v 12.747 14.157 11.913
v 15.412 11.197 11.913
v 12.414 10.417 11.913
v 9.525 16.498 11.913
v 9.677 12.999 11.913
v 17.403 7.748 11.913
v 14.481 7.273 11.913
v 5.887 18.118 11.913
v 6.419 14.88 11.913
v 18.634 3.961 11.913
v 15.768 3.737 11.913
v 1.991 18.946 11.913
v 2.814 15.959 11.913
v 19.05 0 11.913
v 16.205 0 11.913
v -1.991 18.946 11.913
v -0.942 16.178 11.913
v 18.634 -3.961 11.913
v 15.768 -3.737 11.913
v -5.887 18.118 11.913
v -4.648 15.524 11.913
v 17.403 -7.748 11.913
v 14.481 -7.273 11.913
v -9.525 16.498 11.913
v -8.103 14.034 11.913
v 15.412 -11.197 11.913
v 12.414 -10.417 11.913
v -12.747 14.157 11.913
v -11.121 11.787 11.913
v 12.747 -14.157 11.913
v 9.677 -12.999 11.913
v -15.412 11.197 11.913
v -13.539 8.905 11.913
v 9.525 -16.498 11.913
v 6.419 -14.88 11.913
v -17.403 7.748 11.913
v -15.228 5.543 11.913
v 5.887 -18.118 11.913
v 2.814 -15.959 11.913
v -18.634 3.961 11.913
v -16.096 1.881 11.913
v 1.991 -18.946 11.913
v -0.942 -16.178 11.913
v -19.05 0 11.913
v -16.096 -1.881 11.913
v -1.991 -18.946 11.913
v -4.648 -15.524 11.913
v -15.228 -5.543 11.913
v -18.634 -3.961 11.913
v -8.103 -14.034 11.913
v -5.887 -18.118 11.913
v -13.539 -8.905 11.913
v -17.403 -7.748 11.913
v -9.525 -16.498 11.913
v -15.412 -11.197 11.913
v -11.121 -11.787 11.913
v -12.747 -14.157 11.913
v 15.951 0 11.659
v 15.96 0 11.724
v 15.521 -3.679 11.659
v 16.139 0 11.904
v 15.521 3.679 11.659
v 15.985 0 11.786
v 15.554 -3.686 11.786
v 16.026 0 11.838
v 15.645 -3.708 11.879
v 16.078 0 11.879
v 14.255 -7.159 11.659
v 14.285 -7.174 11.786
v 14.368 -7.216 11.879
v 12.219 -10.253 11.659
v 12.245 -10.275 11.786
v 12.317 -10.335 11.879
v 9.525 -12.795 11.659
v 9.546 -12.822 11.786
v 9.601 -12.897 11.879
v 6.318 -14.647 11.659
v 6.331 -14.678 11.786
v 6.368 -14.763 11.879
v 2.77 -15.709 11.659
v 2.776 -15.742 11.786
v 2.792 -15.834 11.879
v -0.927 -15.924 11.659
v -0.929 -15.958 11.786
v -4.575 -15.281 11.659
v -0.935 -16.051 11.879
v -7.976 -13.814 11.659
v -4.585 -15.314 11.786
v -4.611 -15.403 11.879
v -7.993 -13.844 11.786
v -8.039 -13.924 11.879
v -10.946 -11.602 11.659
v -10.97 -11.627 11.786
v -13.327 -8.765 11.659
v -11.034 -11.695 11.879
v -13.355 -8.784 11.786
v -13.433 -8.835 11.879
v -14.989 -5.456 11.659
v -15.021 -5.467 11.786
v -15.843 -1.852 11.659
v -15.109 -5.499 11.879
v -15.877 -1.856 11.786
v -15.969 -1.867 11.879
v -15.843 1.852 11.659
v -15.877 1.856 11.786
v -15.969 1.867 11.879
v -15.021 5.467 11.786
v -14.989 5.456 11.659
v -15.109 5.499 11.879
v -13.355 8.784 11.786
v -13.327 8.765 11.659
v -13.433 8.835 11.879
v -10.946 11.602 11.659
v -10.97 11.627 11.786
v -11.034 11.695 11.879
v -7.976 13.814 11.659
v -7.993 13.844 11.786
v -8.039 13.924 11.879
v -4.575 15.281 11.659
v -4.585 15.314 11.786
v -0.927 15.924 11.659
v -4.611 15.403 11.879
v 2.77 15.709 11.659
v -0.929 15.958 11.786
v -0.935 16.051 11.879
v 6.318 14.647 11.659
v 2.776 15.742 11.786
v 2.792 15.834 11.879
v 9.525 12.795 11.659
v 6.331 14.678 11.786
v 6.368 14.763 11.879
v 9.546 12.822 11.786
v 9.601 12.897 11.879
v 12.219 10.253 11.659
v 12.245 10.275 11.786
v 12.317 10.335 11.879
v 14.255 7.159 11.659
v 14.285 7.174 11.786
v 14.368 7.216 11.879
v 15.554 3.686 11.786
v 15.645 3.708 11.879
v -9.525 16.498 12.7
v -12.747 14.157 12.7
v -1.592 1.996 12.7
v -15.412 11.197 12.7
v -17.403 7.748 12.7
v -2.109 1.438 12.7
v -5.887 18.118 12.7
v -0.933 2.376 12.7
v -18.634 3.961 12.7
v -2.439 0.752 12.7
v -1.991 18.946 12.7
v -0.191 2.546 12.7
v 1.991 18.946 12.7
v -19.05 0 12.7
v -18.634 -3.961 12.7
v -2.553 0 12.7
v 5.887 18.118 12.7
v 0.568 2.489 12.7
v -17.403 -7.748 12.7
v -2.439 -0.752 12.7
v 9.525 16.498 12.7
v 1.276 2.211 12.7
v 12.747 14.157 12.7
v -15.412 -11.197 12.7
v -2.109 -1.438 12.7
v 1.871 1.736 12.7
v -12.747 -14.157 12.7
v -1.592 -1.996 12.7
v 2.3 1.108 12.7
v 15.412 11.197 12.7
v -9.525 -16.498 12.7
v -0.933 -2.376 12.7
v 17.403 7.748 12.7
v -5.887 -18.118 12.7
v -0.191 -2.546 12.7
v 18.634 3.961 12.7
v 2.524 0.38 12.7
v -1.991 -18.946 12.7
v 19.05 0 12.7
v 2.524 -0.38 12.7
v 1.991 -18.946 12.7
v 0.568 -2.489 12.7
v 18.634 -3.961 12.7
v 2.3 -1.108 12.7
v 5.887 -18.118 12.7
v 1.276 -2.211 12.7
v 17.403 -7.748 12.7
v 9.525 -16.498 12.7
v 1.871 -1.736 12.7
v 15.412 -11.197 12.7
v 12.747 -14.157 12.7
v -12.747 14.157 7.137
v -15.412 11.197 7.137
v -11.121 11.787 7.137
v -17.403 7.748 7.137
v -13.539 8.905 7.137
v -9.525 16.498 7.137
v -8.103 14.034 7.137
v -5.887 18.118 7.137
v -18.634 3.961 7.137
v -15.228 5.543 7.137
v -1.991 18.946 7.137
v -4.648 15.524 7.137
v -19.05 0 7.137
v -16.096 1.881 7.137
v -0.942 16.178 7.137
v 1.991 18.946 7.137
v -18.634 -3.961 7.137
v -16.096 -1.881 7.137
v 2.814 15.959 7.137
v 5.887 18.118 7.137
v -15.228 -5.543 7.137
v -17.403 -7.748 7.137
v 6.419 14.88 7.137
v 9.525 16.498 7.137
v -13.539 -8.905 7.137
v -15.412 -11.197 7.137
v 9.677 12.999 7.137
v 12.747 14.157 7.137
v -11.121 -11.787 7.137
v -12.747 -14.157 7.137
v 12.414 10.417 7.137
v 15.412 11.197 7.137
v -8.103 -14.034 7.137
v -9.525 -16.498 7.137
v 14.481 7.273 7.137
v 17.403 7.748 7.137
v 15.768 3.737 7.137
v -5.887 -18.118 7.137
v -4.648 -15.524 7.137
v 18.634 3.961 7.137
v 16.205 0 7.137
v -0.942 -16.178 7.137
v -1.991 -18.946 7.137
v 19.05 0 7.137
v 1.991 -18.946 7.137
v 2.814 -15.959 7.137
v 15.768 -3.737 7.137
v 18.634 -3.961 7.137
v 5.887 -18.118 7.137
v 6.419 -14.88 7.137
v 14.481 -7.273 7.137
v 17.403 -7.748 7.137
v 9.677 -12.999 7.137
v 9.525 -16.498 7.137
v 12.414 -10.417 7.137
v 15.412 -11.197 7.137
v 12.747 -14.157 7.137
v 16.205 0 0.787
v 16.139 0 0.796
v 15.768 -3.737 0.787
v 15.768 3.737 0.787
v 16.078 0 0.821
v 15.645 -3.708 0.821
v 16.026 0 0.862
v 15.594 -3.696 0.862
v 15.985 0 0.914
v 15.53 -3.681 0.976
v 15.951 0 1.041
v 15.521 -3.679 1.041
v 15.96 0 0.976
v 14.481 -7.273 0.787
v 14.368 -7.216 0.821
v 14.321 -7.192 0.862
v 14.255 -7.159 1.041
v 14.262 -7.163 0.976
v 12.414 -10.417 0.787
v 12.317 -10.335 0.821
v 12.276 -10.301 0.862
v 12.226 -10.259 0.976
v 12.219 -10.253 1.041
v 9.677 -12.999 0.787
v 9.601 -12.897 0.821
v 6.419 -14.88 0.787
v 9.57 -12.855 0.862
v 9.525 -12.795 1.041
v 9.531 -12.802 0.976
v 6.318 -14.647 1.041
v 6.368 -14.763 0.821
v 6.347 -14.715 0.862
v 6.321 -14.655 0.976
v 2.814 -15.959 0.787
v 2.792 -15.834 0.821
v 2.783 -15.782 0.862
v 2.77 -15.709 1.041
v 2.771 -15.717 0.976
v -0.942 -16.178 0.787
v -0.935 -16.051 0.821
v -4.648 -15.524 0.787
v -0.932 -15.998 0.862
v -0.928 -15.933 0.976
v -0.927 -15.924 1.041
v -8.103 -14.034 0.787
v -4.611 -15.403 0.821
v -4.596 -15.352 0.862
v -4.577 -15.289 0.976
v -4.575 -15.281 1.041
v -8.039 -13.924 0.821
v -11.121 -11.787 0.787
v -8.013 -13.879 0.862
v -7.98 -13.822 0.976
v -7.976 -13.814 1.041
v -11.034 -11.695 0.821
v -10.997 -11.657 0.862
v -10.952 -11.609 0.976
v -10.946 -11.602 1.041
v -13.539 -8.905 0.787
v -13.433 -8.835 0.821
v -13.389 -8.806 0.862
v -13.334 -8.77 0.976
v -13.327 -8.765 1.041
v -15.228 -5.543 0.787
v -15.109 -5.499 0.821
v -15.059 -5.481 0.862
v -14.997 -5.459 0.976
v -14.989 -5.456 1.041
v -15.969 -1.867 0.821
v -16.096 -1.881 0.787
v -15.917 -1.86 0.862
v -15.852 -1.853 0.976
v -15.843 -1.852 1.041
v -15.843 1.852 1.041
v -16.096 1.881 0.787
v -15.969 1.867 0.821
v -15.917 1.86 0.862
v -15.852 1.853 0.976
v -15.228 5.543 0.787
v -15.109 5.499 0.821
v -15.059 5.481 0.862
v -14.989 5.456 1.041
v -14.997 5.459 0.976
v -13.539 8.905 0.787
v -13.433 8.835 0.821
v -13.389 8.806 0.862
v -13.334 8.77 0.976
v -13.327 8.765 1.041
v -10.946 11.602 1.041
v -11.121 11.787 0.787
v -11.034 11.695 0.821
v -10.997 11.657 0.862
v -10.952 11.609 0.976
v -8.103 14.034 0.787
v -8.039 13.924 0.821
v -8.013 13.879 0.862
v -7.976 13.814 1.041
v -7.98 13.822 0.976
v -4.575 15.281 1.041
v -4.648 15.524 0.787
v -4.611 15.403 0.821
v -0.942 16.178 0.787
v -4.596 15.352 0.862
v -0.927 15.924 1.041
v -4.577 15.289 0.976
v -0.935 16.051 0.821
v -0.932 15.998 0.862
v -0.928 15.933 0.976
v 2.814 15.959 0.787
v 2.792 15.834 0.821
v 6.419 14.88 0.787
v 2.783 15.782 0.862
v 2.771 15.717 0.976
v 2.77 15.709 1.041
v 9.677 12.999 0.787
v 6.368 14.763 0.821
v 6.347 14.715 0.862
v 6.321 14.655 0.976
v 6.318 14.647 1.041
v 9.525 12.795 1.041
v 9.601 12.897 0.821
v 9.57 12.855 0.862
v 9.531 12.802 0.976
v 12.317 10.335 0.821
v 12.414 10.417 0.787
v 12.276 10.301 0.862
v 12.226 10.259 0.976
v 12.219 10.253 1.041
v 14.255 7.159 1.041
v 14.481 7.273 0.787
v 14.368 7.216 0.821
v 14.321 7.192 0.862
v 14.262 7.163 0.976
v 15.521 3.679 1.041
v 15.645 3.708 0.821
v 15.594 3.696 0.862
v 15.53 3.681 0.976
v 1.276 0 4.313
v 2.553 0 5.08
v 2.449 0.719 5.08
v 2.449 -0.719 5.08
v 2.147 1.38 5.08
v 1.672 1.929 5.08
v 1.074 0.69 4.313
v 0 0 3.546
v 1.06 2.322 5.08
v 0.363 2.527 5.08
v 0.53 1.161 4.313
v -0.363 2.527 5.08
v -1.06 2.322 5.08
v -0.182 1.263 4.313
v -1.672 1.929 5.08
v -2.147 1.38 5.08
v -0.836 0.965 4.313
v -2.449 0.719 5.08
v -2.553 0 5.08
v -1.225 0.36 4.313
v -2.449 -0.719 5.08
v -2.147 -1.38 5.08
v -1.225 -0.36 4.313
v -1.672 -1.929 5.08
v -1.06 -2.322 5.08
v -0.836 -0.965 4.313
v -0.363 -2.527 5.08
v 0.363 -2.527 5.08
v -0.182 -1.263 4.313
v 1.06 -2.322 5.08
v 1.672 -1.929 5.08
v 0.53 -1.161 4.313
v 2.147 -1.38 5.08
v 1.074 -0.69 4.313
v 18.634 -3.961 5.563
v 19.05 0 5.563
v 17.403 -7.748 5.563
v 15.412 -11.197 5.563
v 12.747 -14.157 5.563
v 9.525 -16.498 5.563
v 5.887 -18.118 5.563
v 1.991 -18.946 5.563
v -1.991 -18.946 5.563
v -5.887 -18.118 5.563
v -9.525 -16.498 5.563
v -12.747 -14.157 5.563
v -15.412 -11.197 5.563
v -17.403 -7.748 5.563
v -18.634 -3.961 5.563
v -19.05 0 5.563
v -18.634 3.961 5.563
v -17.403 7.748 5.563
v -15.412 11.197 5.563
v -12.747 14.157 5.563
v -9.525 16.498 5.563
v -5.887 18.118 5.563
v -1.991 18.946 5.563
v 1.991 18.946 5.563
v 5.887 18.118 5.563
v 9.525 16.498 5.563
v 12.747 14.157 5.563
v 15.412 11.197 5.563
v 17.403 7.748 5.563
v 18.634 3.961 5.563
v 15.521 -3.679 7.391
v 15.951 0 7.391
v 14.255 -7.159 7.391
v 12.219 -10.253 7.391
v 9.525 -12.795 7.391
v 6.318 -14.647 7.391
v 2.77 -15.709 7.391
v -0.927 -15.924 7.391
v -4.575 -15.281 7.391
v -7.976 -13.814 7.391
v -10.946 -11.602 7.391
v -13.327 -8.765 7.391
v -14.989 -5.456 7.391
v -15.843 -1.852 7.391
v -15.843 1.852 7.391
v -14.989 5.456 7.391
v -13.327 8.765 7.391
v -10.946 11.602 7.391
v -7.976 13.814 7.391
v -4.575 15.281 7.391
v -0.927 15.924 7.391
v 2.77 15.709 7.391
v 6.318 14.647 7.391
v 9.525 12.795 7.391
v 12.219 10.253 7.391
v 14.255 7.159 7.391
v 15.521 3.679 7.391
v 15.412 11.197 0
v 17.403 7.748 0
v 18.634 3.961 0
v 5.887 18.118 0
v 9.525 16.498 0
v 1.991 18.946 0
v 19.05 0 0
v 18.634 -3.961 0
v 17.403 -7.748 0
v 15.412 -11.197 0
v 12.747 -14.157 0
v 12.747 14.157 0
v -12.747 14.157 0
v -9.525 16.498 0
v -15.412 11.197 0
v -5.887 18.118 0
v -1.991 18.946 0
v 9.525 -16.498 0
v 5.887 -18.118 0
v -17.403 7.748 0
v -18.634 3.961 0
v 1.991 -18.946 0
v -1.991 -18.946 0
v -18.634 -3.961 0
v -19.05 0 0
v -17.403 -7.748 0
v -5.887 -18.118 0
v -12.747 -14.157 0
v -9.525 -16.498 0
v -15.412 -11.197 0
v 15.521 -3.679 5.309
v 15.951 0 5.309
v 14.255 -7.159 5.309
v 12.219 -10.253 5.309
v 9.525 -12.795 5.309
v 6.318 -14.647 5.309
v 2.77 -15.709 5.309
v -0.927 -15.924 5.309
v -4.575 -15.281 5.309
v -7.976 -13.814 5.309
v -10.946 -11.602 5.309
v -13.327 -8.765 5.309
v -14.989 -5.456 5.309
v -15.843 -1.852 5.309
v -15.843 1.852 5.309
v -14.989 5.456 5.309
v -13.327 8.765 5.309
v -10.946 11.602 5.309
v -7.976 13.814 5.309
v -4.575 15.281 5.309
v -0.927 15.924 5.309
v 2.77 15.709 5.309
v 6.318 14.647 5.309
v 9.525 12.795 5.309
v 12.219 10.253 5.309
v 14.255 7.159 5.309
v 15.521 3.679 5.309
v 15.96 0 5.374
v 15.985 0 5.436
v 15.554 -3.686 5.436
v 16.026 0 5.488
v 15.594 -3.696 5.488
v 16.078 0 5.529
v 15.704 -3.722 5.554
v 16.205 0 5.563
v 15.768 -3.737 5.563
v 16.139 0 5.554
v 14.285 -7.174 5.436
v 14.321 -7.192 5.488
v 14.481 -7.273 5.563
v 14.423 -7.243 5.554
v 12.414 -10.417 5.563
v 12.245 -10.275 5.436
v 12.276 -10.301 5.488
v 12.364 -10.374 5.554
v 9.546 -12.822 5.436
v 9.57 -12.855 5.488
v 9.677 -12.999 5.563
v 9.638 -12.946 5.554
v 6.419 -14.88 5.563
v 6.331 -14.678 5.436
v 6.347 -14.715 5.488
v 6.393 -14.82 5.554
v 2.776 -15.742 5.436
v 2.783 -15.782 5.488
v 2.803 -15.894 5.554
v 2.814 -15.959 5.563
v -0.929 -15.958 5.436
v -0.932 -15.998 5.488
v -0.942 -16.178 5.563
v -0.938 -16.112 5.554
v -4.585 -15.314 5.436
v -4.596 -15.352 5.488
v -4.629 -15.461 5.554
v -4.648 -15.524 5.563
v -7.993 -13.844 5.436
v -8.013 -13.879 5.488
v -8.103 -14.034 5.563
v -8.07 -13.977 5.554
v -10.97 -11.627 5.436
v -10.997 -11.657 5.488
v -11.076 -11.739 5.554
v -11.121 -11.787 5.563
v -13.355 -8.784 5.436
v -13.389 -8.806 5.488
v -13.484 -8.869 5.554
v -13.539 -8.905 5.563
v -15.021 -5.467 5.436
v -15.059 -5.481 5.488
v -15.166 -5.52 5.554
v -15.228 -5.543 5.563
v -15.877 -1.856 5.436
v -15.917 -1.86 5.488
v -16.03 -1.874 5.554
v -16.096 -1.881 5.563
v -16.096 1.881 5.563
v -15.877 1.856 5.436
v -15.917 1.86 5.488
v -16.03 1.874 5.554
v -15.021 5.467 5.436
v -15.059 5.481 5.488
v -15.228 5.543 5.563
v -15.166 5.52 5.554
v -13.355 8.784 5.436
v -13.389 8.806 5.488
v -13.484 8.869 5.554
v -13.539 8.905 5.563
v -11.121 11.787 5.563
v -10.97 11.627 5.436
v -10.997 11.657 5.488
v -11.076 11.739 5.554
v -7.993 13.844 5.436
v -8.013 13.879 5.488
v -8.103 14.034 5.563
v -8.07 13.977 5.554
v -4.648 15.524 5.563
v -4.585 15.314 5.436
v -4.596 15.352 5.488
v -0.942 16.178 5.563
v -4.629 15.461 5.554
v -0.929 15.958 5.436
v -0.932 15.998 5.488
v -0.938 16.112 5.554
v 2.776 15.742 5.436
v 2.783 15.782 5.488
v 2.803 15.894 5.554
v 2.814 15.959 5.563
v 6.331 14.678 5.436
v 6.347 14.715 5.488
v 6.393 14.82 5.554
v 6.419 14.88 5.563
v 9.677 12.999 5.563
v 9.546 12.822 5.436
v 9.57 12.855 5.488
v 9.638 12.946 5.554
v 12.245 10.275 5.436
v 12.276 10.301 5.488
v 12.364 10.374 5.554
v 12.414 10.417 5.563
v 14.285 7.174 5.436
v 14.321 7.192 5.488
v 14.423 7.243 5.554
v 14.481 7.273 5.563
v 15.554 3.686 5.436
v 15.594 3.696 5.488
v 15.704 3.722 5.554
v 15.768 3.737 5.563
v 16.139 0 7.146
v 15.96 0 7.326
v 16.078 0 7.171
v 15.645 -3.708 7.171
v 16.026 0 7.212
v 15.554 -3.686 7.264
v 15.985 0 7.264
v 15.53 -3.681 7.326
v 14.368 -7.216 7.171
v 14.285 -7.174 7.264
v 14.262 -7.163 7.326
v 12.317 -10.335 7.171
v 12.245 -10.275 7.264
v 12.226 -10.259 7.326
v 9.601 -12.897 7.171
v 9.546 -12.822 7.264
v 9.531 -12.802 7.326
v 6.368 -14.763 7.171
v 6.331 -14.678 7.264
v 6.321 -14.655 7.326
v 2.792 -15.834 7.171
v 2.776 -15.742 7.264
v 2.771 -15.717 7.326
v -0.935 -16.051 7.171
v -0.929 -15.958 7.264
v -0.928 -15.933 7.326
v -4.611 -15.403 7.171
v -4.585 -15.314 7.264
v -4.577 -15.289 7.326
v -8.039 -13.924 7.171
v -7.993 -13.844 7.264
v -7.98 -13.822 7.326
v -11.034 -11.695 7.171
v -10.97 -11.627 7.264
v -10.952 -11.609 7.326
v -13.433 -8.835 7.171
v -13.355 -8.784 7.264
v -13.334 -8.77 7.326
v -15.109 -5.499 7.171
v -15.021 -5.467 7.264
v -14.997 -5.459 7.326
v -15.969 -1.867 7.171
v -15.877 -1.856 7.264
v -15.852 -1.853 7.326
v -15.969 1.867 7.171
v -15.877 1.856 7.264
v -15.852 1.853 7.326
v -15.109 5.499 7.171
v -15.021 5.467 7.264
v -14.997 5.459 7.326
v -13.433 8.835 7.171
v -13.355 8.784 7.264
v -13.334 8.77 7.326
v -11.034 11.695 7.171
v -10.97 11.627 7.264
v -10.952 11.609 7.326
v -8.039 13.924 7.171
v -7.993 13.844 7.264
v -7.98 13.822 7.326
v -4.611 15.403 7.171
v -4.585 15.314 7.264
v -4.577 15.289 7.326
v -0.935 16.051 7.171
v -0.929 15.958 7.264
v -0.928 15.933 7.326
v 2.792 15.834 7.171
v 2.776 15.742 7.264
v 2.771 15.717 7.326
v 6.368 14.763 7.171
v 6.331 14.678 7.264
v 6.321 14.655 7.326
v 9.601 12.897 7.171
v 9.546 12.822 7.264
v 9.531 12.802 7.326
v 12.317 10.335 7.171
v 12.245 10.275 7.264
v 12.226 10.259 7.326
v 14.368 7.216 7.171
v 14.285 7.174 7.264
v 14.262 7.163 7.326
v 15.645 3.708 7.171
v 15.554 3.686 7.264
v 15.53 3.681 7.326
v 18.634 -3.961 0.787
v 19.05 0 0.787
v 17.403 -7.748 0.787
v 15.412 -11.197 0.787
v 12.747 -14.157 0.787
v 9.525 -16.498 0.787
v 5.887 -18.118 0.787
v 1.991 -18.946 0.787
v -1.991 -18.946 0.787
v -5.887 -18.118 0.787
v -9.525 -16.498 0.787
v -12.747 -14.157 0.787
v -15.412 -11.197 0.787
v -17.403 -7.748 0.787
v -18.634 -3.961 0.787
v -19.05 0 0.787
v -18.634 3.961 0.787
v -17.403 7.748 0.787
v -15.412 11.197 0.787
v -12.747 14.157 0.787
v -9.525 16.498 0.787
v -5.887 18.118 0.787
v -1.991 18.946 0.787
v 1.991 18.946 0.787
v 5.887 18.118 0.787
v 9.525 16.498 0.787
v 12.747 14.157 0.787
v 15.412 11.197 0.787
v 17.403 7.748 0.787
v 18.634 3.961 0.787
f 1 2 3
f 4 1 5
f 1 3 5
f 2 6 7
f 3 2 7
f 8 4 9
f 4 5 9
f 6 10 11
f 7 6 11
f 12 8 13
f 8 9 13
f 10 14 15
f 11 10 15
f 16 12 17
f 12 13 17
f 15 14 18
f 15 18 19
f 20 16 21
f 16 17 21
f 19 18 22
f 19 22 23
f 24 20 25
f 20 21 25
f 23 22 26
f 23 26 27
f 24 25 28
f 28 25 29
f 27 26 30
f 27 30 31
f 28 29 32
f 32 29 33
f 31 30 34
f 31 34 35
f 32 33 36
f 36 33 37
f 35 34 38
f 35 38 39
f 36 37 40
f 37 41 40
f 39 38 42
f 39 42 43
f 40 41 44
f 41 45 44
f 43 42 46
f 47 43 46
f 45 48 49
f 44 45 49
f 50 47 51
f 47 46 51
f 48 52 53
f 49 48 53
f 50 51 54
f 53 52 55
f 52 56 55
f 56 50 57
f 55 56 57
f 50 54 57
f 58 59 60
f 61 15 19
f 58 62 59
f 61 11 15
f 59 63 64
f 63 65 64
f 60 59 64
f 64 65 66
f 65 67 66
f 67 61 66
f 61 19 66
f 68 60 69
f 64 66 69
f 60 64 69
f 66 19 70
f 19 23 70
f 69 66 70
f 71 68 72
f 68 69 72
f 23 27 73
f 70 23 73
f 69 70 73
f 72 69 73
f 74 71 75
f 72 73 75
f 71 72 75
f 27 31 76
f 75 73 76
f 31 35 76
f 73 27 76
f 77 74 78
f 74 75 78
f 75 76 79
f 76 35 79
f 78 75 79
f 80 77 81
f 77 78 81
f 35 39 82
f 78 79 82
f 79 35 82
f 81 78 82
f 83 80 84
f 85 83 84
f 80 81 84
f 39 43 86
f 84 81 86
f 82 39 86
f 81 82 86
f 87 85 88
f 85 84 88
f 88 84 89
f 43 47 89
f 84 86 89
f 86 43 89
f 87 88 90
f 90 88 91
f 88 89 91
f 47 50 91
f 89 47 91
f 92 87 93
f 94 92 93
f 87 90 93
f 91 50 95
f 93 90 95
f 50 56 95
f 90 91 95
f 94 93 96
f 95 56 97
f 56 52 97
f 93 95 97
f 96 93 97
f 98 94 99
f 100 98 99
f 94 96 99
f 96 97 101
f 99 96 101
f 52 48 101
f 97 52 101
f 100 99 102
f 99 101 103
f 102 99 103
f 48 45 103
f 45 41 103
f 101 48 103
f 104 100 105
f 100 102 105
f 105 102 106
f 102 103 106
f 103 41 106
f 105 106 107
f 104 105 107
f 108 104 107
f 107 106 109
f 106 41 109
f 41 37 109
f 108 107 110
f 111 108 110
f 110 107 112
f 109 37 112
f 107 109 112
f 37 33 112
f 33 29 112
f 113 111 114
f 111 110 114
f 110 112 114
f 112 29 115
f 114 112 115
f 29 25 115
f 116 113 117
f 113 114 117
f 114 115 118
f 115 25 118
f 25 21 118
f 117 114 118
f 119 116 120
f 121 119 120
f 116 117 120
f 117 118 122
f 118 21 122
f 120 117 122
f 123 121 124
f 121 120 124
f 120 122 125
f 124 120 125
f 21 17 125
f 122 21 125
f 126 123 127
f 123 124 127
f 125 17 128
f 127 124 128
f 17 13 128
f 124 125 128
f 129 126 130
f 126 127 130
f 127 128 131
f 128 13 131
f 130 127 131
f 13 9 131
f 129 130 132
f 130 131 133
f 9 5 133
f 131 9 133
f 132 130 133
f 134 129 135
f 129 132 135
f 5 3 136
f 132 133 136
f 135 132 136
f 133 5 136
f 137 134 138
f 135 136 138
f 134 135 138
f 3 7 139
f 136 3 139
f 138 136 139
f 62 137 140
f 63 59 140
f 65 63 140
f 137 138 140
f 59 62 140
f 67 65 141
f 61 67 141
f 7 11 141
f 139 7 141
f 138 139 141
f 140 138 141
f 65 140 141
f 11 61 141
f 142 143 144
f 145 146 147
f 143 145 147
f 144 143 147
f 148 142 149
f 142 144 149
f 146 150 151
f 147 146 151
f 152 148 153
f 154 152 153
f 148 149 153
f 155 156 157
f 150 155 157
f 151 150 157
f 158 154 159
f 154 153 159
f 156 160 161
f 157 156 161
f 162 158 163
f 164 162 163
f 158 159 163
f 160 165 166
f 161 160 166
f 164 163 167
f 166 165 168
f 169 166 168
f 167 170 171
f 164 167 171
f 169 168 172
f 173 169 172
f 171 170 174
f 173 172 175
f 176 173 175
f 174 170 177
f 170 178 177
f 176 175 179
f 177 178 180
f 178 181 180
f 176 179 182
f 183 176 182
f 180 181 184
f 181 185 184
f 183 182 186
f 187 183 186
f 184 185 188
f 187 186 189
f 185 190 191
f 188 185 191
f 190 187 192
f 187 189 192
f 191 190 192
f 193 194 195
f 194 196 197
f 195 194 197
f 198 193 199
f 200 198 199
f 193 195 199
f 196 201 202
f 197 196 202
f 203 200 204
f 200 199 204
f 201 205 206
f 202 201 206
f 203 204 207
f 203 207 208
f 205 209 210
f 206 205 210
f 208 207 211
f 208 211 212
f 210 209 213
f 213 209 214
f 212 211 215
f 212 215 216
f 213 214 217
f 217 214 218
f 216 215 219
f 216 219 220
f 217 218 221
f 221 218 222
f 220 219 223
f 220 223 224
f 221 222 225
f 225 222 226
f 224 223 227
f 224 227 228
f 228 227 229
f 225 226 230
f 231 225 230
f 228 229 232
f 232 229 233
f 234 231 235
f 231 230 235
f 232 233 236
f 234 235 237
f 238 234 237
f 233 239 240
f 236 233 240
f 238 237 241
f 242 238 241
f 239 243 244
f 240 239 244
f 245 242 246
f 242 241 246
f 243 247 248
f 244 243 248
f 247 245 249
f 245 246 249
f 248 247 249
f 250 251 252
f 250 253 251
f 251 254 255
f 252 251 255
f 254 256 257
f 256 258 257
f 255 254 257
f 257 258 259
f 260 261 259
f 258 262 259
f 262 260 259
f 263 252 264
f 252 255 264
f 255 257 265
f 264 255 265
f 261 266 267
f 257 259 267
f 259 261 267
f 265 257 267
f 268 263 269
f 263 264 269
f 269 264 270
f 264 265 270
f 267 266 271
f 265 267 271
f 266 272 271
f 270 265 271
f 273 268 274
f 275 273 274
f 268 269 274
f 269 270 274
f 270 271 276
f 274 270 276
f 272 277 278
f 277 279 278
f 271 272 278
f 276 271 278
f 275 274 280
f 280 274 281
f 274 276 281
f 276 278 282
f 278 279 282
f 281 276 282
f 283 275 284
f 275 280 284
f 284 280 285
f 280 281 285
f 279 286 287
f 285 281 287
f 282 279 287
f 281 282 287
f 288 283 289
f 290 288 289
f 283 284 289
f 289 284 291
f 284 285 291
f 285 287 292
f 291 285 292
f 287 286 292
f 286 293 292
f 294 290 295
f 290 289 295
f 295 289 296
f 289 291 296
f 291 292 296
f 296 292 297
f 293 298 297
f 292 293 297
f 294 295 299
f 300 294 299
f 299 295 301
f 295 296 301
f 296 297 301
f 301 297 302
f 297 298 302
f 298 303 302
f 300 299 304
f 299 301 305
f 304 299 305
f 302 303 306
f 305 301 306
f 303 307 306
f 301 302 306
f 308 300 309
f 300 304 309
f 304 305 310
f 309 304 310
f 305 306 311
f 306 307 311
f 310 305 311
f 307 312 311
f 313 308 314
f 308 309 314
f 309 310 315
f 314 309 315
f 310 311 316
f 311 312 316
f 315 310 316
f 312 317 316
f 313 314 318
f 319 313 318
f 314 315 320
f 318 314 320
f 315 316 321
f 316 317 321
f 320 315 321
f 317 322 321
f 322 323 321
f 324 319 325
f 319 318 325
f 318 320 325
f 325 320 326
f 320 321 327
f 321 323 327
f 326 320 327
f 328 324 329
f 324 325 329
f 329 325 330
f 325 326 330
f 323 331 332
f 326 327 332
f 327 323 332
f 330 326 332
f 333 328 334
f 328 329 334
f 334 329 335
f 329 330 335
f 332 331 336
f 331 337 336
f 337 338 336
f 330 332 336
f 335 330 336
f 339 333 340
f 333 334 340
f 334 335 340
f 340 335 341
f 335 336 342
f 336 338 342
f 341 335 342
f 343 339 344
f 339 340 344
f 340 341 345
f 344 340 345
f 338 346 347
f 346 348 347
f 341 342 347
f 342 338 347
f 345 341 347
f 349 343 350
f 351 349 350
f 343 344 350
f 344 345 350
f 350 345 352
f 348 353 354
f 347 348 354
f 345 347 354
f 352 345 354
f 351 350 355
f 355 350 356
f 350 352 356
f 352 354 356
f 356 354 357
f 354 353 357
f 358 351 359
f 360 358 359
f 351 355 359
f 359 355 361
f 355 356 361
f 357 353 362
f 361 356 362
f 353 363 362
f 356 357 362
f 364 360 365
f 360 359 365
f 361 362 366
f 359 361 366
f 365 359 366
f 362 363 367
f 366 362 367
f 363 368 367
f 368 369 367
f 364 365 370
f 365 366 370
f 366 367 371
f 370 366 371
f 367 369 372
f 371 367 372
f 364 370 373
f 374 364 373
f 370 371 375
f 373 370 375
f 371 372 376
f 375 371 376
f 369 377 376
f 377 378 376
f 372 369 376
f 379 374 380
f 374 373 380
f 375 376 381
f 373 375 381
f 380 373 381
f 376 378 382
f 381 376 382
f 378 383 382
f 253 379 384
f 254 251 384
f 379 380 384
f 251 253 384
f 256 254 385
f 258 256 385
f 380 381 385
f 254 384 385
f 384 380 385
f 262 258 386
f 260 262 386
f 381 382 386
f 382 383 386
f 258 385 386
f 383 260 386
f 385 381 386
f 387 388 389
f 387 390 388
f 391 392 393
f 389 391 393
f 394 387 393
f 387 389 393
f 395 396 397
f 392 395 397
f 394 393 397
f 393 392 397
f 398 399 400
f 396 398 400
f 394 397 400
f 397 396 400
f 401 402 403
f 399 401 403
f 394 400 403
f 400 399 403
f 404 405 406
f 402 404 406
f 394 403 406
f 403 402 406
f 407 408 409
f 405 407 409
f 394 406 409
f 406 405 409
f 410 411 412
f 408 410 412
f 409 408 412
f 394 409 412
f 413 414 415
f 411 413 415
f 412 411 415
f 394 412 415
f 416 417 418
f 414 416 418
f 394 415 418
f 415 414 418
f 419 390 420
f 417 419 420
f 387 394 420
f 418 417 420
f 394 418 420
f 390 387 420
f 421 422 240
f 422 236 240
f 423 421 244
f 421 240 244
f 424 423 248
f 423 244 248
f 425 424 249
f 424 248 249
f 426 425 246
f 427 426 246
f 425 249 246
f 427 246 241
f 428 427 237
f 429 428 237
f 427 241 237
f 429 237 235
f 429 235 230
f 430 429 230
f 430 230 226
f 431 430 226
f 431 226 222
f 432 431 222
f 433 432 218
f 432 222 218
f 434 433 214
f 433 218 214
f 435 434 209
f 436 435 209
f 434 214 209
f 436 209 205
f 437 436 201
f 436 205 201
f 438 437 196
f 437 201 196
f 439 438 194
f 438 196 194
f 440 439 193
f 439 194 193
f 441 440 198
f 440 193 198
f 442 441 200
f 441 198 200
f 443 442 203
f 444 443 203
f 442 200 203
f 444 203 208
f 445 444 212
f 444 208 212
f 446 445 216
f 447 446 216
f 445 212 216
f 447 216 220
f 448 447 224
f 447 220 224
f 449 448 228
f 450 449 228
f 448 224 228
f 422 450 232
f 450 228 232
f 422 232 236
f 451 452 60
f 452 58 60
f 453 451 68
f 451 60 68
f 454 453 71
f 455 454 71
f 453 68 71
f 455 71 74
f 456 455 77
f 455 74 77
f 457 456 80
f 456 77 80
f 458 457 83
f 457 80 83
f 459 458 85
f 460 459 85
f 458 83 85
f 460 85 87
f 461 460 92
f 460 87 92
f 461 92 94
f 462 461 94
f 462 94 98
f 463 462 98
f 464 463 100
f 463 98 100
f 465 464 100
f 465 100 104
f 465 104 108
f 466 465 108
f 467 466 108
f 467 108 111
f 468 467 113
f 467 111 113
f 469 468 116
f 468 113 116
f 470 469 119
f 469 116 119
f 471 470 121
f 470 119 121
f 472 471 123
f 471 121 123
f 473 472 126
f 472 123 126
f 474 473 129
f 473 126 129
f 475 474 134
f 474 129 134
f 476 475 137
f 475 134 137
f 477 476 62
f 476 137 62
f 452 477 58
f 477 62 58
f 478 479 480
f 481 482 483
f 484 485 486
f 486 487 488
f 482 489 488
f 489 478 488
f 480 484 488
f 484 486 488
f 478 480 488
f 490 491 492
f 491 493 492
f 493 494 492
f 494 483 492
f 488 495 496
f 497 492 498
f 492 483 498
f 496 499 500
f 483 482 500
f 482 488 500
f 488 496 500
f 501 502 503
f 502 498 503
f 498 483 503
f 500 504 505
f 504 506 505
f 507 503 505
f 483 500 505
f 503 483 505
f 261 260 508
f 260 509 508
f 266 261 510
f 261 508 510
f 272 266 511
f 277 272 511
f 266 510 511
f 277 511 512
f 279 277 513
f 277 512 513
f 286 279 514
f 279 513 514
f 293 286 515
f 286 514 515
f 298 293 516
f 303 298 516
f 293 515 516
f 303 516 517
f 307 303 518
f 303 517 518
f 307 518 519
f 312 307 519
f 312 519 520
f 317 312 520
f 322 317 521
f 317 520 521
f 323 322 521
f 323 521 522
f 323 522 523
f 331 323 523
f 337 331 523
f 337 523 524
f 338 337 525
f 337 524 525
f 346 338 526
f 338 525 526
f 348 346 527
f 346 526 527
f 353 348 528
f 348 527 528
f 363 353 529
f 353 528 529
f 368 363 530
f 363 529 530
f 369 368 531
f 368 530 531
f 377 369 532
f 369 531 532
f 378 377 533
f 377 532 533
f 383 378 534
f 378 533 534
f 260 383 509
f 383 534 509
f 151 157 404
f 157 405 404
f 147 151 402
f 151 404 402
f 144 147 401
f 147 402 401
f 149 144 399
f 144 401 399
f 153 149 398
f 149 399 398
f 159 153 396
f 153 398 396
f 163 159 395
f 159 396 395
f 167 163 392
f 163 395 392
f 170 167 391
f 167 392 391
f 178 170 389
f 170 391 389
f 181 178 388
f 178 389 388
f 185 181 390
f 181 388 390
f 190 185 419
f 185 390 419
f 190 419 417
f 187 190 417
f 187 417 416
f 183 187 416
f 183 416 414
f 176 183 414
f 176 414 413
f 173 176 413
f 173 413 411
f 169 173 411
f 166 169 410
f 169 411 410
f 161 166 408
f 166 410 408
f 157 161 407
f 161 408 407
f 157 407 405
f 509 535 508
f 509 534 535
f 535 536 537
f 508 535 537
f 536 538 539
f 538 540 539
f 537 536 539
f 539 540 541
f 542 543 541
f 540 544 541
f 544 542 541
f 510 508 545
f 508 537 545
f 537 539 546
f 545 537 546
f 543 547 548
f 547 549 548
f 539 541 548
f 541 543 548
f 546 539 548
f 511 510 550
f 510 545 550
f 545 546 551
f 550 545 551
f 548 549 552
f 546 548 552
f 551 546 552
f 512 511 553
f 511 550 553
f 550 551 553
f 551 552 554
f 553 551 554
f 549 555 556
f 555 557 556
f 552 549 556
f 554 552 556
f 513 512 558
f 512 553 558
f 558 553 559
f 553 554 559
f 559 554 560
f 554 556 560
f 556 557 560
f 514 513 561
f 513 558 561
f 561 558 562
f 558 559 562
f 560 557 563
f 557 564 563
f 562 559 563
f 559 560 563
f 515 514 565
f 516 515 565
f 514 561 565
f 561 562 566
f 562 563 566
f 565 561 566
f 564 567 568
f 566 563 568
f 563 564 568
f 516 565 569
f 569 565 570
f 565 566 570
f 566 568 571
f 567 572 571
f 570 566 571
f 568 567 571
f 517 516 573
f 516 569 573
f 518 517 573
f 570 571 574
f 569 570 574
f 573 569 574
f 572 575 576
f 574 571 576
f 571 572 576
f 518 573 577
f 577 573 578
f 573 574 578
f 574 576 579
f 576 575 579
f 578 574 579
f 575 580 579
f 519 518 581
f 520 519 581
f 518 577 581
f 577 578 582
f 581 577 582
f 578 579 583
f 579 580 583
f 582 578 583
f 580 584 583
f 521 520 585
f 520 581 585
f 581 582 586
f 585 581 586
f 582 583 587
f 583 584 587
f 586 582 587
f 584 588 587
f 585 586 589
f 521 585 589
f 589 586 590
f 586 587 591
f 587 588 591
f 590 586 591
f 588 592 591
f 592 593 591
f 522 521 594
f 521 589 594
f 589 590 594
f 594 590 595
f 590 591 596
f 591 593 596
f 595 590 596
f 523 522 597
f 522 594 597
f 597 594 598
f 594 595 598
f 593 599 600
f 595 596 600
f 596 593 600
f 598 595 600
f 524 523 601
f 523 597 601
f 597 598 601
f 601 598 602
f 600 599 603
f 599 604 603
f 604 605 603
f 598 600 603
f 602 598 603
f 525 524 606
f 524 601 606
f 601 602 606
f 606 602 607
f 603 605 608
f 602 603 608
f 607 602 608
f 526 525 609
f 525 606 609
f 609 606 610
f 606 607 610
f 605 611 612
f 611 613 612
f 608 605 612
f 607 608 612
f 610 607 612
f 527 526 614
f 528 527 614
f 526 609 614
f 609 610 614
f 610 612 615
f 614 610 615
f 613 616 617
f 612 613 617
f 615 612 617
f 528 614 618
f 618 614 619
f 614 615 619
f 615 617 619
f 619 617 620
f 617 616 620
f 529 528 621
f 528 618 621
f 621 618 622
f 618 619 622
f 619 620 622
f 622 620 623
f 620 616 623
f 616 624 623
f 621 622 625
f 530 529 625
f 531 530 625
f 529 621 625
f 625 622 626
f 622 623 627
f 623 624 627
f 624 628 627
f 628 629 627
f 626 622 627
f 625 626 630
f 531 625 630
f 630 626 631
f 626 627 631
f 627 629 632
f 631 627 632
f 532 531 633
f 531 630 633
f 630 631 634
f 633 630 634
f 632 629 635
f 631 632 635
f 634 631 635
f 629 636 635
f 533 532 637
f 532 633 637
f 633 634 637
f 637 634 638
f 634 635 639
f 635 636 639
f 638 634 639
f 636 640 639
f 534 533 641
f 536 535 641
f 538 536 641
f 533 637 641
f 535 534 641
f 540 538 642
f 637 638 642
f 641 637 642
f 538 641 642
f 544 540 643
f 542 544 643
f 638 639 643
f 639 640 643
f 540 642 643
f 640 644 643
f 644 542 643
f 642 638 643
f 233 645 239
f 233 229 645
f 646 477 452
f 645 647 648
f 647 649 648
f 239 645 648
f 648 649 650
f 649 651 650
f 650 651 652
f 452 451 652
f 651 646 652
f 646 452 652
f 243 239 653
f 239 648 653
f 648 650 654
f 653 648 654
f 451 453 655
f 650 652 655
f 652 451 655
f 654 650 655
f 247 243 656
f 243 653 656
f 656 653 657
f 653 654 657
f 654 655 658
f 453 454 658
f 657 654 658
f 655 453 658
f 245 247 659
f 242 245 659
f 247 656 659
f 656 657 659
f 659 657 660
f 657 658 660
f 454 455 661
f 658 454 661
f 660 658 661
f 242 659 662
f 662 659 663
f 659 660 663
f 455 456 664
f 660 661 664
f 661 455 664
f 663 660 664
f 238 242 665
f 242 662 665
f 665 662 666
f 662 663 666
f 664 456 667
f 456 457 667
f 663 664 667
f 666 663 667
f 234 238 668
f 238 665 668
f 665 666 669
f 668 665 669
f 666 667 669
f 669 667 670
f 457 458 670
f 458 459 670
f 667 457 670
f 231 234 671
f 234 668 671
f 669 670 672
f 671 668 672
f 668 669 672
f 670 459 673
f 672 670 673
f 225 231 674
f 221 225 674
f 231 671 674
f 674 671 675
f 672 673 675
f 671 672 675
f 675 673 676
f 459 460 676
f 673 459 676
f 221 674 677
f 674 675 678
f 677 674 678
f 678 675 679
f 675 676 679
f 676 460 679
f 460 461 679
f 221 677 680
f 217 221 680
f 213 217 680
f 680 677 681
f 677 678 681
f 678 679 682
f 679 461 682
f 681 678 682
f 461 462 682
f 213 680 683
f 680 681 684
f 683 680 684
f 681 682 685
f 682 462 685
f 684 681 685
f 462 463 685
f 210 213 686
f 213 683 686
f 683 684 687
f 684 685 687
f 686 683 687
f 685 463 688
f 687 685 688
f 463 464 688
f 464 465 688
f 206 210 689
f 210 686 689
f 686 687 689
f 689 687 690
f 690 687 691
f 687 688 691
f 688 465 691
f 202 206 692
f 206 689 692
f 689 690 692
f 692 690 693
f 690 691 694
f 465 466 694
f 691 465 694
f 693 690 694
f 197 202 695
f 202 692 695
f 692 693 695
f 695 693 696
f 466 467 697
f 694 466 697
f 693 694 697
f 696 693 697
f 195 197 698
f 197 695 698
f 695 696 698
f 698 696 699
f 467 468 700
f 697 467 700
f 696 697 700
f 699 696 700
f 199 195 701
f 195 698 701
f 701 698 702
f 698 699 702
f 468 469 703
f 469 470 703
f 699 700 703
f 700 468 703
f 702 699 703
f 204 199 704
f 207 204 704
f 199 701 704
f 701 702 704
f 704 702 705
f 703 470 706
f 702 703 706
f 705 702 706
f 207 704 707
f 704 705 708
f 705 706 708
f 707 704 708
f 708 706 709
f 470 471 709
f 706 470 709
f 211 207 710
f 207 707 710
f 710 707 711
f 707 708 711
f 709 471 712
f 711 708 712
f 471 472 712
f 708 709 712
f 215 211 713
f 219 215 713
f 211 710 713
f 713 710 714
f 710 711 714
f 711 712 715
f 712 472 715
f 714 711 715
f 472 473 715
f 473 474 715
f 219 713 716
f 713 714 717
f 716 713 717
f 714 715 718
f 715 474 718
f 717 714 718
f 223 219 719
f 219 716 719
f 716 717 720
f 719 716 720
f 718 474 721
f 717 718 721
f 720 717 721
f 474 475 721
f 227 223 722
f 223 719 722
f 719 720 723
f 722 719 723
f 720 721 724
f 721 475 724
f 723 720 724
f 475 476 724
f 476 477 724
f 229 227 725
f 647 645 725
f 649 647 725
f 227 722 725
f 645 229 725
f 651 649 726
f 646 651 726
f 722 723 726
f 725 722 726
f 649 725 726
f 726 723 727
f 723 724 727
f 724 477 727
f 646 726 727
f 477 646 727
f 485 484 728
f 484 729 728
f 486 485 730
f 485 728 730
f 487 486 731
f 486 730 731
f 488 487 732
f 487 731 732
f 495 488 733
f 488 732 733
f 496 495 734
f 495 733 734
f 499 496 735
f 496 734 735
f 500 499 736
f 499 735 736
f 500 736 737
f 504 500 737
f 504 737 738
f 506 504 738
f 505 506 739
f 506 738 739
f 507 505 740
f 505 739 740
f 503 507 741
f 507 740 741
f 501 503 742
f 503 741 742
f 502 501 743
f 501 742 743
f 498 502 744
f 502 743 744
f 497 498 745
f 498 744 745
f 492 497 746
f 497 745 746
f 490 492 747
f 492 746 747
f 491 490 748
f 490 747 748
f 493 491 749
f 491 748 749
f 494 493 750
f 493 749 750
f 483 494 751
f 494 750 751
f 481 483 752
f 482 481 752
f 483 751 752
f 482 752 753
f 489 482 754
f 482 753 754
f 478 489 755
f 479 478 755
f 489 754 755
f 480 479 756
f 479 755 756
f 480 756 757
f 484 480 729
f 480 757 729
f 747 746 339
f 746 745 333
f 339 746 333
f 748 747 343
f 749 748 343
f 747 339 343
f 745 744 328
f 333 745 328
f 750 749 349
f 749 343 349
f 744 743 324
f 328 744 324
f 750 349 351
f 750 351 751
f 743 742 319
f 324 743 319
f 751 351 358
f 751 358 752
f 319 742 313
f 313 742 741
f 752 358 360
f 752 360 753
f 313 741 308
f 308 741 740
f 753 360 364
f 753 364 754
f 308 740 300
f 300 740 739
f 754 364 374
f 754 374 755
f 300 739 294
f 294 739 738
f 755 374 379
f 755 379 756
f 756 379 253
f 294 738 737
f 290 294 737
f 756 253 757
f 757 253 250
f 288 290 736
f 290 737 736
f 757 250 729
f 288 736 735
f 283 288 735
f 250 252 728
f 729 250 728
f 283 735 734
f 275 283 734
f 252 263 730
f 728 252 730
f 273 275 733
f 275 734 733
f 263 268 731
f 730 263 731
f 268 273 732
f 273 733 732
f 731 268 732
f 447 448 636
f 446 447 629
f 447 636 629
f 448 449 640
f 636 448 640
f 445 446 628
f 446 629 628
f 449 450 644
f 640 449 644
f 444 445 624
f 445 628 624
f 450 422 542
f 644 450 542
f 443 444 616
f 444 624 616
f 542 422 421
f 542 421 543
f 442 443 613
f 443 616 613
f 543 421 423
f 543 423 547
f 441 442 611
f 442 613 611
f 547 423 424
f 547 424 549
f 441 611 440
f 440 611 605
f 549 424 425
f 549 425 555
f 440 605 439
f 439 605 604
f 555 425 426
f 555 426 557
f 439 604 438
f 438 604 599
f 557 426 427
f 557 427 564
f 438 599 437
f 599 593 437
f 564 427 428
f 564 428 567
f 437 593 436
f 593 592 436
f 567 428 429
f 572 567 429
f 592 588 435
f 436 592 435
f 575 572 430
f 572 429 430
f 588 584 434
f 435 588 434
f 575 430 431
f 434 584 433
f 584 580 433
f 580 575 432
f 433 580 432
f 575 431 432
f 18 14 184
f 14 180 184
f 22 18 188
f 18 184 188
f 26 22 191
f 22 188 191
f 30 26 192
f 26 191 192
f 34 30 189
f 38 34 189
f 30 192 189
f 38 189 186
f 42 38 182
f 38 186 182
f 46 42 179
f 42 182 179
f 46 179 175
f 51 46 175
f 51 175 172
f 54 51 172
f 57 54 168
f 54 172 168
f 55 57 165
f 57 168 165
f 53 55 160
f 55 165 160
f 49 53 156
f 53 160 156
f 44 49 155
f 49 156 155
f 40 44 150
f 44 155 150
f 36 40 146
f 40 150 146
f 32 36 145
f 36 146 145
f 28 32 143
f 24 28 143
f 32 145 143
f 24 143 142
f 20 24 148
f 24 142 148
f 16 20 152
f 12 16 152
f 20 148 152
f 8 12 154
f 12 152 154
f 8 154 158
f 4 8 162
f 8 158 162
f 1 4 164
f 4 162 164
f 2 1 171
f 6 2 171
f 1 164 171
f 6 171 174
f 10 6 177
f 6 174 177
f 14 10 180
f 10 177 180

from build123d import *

# Parameters (mm, degrees)
F3_D     = 5.1054
F3_DEPTH = 7.62
F3_TIP   = 1.5338169022


with BuildPart() as f1:
    # F0 (on Front) → F1 (revolve)
    with BuildSketch(Plane.XZ):
        with BuildLine():
            Line((19.05, 12.7), (0, 12.7))
            Line((0, 12.7), (0, 0))
            Line((0, 0), (19.05, 0))
            Line((19.05, 0), (19.05, 0.7874))
            Line((19.05, 0.7874), (16.2052, 0.7874))
            ThreePointArc((16.2052, 0.7874), (16.0255948776, 0.8617948776), (15.9512, 1.0414))
            Line((15.9512, 1.0414), (15.9512, 3.175))
            Line((15.9512, 3.175), (15.9512, 5.3086))
            ThreePointArc((15.9512, 5.3086), (16.0255948776, 5.4882051224), (16.2052, 5.5626))
            Line((16.2052, 5.5626), (19.05, 5.5626))
            Line((19.05, 5.5626), (19.05, 7.1374))
            Line((19.05, 7.1374), (16.2052, 7.1374))
            ThreePointArc((16.2052, 7.1374), (16.0255948776, 7.2117948776), (15.9512, 7.3914))
            Line((15.9512, 7.3914), (15.9512, 9.525))
            Line((15.9512, 9.525), (15.9512, 11.6586))
            ThreePointArc((15.9512, 11.6586), (16.0255948776, 11.8382051224), (16.2052, 11.9126))
            Line((16.2052, 11.9126), (19.05, 11.9126))
            Line((19.05, 11.9126), (19.05, 12.7))
        make_face()
    revolve(axis=Axis((0, 0, 6.35), (0, 0, -1)))

    # F3
    with Locations(Plane.XY.offset(12.7)):
        with Locations((0, 0)):
            Hole(F3_D / 2, depth=F3_DEPTH)
            with Locations((0, 0, -(F3_DEPTH + F3_TIP / 2))):  # 118° drill point
                Cone(0, F3_D / 2, F3_TIP, mode=Mode.SUBTRACT)


solid = f1.part
